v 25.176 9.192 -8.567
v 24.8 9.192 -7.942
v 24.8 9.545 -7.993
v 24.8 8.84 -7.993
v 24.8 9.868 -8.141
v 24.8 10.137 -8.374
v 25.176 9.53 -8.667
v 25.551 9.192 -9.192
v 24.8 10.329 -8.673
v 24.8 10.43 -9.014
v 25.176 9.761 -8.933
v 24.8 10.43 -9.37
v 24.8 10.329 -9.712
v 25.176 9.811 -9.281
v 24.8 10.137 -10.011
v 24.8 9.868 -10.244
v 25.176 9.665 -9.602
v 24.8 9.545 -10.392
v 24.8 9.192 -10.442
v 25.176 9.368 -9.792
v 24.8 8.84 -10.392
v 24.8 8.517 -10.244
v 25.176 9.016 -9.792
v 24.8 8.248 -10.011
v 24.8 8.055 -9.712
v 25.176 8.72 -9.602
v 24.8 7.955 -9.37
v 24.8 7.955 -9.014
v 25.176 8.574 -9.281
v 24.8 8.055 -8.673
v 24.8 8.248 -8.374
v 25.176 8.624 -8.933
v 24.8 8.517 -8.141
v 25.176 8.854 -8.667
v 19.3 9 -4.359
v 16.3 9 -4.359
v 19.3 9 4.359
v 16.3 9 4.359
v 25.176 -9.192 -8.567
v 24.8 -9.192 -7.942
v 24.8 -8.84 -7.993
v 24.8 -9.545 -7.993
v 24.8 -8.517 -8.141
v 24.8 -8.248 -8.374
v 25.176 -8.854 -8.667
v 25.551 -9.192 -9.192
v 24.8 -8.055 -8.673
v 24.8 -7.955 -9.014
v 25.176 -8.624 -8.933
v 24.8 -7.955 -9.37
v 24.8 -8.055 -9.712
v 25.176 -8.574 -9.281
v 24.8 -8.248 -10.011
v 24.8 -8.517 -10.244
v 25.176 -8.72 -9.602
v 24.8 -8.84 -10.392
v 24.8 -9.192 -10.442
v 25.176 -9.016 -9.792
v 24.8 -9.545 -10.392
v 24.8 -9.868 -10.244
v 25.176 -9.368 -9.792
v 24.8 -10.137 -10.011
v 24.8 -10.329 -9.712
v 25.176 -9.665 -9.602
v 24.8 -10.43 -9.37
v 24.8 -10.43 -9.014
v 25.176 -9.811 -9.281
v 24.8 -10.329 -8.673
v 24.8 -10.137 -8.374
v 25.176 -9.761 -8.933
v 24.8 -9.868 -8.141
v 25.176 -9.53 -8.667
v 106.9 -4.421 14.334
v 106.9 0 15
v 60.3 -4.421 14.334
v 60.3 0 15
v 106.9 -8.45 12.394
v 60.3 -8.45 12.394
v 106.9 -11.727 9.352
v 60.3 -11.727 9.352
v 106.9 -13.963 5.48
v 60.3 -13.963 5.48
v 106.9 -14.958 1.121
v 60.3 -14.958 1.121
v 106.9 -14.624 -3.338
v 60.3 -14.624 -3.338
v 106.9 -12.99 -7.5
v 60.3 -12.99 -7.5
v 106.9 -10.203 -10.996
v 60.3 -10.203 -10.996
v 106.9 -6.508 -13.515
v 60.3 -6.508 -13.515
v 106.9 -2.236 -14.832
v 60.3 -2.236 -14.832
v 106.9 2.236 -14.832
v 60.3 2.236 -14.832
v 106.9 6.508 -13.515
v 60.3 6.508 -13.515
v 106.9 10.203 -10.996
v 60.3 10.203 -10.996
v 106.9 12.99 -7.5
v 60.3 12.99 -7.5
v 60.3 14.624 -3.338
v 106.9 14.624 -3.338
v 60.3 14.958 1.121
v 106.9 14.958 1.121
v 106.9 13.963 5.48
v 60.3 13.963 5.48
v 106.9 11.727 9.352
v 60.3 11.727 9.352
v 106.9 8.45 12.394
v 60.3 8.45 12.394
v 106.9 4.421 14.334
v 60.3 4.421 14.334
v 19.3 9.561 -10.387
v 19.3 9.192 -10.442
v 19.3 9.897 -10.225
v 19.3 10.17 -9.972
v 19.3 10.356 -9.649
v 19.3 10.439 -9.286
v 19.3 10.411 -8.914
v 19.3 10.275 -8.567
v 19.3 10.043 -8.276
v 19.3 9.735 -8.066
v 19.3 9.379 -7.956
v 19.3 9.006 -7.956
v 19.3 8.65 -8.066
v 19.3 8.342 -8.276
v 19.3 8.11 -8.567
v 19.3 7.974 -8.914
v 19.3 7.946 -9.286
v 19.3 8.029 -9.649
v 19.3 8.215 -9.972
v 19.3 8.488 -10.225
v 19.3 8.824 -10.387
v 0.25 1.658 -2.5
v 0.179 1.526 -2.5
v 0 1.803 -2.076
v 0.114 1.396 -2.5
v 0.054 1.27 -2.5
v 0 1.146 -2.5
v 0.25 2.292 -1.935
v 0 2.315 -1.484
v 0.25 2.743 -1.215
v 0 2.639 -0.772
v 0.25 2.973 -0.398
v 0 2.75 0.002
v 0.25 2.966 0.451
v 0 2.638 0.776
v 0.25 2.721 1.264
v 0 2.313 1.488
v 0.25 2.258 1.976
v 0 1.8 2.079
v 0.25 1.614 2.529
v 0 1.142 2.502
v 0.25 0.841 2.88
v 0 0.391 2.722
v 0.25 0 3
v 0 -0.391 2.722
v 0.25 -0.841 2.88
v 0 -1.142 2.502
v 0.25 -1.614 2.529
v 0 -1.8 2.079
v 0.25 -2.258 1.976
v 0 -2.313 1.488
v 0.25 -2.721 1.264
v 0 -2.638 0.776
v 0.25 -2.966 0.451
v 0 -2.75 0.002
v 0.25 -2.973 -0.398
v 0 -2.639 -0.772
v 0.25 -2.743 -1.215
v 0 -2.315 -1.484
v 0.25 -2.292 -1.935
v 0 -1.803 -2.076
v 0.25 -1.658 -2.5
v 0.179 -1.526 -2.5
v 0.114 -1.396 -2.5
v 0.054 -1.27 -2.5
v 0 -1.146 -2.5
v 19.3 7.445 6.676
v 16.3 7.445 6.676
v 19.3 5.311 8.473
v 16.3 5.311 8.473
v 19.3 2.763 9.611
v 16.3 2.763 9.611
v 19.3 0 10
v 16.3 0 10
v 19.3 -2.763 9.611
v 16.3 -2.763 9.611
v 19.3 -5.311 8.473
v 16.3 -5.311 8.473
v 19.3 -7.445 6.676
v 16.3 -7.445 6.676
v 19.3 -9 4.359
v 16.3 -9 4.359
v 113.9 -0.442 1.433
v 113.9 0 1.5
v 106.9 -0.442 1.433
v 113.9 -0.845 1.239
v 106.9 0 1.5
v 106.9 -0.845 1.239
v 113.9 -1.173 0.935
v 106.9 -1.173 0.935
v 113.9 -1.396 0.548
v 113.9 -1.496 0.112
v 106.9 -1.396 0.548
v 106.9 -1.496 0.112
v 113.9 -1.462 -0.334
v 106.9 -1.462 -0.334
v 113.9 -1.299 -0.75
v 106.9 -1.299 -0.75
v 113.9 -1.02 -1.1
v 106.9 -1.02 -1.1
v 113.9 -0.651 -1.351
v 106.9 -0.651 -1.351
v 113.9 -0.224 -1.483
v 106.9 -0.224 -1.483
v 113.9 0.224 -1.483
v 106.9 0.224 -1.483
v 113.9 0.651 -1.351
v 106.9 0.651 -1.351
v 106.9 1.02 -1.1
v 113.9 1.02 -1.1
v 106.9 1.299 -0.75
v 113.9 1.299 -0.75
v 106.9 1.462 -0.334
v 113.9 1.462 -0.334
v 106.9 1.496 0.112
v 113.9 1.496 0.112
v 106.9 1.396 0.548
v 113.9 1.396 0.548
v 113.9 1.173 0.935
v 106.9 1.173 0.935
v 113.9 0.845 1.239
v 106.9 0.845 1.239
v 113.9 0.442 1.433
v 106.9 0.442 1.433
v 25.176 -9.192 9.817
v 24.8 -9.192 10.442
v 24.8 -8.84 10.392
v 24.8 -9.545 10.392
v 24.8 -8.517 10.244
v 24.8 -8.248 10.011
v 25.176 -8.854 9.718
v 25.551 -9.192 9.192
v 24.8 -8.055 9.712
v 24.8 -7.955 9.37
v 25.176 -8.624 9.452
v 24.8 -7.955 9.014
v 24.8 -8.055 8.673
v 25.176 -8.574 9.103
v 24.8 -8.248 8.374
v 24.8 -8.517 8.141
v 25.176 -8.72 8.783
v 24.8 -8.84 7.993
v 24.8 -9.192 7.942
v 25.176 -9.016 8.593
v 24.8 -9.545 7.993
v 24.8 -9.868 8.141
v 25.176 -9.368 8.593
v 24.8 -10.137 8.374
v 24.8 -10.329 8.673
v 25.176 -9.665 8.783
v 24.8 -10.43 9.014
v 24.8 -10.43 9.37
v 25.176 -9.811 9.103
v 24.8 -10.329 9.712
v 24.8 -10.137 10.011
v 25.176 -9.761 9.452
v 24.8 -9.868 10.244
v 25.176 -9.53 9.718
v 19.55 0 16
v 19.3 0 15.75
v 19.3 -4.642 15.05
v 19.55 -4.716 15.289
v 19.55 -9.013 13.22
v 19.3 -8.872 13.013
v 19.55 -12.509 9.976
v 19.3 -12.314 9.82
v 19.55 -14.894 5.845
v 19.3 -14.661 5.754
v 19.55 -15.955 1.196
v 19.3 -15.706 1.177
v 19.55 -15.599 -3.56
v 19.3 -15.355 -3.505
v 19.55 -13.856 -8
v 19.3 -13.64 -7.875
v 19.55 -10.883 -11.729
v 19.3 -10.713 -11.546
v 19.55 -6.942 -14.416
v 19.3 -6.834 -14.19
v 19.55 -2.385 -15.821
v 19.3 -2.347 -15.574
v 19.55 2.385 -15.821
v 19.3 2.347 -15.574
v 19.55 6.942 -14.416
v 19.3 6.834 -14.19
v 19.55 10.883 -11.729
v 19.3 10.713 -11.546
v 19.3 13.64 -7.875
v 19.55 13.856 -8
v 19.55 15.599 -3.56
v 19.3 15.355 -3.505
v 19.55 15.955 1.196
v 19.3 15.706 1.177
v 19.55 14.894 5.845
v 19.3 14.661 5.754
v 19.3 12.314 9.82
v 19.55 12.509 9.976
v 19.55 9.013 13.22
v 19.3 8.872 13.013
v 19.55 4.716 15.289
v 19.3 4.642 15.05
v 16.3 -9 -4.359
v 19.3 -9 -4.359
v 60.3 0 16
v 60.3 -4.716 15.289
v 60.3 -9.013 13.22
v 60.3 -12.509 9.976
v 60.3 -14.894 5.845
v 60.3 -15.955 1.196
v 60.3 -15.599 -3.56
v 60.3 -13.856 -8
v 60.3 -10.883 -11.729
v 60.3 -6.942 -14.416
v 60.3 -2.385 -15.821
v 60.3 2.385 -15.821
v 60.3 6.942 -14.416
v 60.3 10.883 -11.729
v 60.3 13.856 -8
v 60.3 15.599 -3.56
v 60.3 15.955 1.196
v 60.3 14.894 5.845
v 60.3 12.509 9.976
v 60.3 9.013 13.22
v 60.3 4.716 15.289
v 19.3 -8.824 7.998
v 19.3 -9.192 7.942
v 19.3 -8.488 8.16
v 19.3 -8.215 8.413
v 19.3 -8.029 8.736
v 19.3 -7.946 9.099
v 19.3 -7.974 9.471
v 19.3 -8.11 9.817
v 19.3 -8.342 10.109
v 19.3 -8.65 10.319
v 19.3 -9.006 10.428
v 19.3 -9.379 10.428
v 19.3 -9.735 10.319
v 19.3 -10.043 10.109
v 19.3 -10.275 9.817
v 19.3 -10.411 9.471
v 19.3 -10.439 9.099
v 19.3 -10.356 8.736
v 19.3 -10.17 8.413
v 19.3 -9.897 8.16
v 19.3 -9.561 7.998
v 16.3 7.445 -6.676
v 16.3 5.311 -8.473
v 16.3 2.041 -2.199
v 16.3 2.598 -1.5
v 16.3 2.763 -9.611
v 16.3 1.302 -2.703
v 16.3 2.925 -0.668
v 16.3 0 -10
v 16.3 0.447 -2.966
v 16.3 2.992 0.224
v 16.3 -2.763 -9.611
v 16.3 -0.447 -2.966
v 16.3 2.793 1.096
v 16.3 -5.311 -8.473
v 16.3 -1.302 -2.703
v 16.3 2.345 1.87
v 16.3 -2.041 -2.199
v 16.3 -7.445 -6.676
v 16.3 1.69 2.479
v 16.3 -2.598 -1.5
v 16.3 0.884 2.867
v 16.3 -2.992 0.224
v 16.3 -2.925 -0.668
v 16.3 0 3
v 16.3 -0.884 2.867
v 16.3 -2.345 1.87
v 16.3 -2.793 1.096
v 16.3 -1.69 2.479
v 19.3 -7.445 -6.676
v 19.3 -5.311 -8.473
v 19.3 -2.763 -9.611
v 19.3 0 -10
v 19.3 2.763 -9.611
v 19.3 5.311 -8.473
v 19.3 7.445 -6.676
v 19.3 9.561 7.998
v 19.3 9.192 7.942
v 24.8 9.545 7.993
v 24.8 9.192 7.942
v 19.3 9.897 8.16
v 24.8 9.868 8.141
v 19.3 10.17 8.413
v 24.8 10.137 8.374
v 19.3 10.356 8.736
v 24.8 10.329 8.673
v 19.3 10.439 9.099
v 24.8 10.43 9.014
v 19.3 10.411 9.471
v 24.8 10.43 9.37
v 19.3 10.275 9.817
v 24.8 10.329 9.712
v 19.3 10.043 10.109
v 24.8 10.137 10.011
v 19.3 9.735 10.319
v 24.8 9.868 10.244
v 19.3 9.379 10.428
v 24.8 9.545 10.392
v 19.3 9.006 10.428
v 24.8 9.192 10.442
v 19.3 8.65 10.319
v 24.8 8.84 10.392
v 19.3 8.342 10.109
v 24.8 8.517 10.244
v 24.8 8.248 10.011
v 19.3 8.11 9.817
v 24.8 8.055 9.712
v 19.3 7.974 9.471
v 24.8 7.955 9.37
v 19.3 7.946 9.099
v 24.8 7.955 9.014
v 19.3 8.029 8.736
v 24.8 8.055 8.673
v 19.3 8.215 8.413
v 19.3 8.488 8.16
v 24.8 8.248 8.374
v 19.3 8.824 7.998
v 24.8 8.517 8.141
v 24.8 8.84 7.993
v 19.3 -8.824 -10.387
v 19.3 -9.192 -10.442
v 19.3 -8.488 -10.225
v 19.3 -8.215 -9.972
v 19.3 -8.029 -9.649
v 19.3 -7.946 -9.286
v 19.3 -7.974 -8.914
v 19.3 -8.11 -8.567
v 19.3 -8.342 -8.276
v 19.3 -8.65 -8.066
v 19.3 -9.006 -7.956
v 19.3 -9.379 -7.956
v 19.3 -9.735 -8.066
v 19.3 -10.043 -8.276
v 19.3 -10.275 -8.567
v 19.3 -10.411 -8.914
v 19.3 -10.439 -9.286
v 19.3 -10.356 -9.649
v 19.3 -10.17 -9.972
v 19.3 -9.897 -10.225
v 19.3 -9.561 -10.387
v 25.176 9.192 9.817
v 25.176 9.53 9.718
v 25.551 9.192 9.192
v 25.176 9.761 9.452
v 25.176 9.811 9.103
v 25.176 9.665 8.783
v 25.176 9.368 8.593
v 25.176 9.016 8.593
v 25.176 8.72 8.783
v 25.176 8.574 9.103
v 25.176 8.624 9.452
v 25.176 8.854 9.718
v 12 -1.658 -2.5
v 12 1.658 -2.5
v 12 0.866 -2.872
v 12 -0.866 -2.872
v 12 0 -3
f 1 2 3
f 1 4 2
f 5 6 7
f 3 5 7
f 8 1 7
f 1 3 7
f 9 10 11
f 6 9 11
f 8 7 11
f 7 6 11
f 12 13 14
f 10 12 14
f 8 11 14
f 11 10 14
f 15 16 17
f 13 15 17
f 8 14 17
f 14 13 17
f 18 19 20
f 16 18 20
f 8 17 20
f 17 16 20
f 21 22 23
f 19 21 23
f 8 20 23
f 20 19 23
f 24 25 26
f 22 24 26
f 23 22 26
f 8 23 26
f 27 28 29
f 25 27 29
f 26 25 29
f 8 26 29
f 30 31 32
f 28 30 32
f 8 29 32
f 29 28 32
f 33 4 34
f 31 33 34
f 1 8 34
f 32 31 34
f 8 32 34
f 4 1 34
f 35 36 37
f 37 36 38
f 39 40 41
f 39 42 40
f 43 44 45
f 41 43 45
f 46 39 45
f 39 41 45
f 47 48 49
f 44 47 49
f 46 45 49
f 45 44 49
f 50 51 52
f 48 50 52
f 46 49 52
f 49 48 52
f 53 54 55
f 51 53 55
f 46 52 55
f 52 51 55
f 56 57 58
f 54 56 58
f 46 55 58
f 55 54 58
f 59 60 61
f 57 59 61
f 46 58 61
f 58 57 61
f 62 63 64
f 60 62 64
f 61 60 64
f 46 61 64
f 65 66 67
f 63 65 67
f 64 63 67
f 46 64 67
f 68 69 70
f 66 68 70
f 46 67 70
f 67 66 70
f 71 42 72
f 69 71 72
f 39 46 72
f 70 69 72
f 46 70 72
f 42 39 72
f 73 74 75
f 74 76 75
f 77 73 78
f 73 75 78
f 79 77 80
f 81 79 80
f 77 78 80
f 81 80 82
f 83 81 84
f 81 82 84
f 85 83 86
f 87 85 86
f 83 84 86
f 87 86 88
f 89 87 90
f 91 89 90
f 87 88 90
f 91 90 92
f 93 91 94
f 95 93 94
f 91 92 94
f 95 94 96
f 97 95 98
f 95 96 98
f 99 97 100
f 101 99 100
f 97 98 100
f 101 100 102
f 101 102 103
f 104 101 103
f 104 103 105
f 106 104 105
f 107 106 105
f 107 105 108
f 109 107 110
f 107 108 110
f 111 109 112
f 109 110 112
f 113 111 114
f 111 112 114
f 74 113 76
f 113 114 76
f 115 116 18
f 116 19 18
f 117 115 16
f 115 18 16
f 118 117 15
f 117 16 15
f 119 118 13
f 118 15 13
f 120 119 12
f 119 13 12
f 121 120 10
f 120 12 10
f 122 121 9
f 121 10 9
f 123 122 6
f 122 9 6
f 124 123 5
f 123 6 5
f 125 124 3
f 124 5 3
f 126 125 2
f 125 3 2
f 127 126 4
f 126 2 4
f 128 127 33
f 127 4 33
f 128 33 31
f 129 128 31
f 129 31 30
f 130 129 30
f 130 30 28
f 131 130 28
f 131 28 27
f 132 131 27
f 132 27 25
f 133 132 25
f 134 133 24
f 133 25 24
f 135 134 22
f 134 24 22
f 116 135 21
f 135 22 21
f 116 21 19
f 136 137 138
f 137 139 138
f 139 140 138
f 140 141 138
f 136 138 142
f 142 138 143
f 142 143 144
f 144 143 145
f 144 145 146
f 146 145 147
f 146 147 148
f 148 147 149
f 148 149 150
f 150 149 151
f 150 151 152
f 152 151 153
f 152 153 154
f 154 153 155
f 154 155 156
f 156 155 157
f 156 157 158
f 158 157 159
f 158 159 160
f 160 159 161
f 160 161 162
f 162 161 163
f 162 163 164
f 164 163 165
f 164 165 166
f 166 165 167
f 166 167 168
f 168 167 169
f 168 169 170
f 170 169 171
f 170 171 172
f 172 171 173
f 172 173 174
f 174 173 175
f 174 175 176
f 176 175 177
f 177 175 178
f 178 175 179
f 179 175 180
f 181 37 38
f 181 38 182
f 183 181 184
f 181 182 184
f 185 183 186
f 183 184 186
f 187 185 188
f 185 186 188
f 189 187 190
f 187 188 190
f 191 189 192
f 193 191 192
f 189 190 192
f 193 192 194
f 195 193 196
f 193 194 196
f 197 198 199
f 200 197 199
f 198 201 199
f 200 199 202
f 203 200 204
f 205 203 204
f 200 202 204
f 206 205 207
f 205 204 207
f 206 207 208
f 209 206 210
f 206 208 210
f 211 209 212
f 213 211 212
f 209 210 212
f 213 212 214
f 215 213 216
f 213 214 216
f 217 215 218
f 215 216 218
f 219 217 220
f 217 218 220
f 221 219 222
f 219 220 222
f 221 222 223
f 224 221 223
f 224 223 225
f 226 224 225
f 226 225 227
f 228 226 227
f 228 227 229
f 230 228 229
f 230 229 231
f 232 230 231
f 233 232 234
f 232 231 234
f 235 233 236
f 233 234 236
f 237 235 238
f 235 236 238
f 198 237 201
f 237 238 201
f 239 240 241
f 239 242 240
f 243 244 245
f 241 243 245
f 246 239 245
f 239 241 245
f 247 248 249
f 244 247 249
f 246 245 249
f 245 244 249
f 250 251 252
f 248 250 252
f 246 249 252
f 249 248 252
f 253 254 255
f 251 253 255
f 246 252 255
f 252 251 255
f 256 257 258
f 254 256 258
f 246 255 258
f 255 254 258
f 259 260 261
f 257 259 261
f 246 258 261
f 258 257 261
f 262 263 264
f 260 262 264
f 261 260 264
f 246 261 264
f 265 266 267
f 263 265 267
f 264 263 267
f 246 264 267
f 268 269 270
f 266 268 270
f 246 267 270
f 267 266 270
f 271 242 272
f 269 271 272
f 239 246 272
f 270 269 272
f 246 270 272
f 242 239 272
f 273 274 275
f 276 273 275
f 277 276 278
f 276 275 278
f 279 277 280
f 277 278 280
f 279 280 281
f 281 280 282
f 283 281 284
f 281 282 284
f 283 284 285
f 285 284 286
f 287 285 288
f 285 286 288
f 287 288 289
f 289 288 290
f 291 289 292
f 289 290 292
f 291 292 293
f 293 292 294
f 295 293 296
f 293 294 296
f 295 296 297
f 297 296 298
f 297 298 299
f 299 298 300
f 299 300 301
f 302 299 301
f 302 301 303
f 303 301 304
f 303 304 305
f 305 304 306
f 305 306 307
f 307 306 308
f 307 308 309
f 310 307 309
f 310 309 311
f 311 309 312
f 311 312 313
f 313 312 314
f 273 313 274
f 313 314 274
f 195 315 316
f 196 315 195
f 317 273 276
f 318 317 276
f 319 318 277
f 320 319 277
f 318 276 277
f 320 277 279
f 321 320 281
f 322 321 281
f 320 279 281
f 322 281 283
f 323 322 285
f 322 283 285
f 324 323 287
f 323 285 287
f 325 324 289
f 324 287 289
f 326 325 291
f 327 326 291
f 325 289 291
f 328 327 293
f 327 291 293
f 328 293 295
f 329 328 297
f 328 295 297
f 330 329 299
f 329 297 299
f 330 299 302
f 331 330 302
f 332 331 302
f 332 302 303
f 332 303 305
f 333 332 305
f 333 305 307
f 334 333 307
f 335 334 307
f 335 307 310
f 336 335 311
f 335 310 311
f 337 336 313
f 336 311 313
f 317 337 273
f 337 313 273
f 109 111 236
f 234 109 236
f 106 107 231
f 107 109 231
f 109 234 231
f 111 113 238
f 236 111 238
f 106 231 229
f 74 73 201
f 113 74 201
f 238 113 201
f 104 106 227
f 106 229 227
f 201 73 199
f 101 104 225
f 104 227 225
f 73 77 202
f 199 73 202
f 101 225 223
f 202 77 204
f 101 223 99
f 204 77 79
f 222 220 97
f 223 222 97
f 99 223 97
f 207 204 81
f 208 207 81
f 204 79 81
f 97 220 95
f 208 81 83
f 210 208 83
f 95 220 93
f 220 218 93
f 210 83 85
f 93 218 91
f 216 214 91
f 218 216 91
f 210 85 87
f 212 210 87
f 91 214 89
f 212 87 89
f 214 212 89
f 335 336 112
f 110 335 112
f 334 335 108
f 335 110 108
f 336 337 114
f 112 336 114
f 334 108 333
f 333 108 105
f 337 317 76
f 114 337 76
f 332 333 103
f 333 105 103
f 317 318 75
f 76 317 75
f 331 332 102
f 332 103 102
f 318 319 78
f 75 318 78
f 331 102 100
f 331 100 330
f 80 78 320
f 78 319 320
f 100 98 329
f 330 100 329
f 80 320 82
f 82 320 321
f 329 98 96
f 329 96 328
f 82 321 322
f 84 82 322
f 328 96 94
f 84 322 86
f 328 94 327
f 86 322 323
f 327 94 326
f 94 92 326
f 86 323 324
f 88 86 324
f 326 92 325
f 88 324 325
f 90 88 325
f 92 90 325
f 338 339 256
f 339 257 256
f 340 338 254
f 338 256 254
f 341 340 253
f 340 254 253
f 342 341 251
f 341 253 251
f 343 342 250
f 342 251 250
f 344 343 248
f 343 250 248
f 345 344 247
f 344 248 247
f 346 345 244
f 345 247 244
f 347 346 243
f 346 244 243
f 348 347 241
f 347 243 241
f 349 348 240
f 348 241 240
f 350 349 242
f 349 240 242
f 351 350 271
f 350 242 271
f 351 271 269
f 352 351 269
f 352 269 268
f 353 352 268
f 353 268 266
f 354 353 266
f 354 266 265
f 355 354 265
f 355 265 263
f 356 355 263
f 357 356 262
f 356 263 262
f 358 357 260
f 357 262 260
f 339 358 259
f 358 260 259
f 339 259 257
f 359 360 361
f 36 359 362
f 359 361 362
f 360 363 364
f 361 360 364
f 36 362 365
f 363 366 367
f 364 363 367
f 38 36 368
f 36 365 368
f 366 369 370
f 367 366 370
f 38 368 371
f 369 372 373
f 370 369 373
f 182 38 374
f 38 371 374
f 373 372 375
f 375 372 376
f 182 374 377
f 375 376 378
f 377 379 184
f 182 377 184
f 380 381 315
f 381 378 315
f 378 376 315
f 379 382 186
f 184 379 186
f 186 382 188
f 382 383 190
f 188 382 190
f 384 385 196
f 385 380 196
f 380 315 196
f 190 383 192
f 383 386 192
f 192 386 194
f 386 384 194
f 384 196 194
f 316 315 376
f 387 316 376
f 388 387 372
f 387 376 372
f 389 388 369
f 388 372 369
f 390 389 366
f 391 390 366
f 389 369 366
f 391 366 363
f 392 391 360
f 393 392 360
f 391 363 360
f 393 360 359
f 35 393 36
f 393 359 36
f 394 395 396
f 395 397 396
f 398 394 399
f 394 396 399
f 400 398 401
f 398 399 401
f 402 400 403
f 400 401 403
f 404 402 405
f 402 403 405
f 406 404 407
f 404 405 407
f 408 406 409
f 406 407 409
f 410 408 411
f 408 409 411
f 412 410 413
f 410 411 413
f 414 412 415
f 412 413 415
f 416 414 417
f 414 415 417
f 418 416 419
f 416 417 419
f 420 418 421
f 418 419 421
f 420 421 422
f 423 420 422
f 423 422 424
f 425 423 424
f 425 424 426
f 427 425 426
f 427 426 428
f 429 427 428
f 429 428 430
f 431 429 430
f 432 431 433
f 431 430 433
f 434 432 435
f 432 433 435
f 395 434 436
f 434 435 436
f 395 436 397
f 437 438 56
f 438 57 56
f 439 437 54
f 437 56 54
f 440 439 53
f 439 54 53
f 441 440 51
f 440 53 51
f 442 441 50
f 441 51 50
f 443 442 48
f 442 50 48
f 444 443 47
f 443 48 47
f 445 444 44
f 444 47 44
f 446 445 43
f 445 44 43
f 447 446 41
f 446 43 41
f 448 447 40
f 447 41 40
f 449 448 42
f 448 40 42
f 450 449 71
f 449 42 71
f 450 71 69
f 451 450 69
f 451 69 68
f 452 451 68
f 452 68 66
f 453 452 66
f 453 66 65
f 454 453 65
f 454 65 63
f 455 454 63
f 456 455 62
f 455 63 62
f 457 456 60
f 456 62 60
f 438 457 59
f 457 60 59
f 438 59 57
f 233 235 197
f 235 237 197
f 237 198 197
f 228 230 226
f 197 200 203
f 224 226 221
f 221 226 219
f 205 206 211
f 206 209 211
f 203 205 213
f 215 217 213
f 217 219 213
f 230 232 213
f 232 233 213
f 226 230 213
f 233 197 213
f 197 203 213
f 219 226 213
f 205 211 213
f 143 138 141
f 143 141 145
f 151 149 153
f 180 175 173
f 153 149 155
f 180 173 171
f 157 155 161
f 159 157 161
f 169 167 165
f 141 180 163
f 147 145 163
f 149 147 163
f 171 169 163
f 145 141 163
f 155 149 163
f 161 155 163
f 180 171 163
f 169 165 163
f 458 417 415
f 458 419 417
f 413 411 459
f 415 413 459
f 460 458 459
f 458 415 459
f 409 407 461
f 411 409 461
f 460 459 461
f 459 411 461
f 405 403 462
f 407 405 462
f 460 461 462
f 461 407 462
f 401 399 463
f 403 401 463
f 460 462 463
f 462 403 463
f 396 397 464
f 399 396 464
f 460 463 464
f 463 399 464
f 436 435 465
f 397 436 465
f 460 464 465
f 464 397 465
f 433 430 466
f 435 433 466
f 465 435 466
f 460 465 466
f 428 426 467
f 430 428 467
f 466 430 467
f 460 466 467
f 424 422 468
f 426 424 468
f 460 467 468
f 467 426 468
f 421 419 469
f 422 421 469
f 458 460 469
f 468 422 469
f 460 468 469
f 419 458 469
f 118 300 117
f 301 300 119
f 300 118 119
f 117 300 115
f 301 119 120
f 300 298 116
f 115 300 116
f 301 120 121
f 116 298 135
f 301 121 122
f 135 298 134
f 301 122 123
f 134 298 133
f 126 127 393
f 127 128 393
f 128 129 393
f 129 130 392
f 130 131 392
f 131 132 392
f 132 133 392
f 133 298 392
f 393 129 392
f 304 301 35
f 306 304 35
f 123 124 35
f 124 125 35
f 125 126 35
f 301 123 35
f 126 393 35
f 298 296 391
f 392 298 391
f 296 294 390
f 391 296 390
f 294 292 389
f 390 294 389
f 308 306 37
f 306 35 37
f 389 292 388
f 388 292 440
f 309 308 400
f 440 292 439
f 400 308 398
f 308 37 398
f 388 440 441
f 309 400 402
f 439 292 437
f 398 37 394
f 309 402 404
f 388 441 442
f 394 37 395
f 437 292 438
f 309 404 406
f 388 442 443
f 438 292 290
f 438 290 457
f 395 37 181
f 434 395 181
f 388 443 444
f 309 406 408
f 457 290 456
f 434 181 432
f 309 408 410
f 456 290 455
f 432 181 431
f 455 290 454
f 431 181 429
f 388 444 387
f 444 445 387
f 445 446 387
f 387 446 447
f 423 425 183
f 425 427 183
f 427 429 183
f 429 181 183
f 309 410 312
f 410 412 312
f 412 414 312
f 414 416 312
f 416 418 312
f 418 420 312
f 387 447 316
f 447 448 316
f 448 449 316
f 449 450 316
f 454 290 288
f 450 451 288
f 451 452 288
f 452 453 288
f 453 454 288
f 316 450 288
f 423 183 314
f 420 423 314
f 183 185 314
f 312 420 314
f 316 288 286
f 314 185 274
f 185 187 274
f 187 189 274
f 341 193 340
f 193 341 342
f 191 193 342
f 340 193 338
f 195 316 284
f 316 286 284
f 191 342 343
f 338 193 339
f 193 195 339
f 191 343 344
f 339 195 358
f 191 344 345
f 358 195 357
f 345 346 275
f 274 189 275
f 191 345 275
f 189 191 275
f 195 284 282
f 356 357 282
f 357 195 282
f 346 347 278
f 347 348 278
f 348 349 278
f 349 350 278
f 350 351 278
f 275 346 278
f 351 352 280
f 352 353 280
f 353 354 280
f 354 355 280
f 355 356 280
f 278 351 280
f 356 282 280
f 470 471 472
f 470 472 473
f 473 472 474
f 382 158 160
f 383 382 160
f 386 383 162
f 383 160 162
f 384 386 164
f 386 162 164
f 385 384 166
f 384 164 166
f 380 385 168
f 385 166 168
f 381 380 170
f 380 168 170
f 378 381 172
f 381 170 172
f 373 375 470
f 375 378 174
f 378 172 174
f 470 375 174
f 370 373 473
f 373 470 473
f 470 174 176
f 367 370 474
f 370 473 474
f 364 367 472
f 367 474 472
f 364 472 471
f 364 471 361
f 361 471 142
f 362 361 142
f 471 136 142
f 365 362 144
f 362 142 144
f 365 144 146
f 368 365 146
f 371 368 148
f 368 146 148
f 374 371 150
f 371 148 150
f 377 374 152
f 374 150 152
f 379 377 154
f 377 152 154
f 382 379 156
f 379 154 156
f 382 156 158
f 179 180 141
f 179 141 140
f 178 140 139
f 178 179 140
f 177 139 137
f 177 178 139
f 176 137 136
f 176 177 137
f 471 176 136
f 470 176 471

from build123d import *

# Parameters (mm, degrees)
CUT_EXTRUDE1_DEPTH        = 117.125836918
CUT_EXTRUDE1_DEPTH_BACK   = 117.125836918
SKETCH2_W                 = 12
SKETCH2_H                 = 0.5
CHAMFER1_SIZE             = 0.25
SKETCH3_W                 = 20
SKETCH3_H                 = 2
CUT_EXTRUDE2_DEPTH        = 3
M3X0_5_TAPPED_HOLE1_D     = 2.5
M3X0_5_TAPPED_HOLE1_DEPTH = 5.5
M3X0_5_TAPPED_HOLE1_TIP   = 0.751075774


with BuildPart() as part:
    # Sketch1 → Revolve1 (revolve)
    with BuildSketch(Plane(origin=(0, 0, 0), x_dir=(1, 0, 0), z_dir=(0, 1, 0)), mode=Mode.PRIVATE) as revolve1_sk:
        Polygon((0, 0), (113.9, 0), (113.9, 1.5), (106.9, 1.5), (106.9, 15), (60.3, 15), (60.3, 16), (19.3, 16), (19.3, 10), (16.3, 10), (16.3, 3), (0, 3), align=None)
    revolve(revolve1_sk.sketch.rotate(Axis((0, 0, 0), (1, 0, 0)), 180), axis=Axis((0, 0, 0), (1, 0, 0)))

    # Sketch2 → Cut-Extrude1 (cut, two sides: drawn at the far end of the back side and taken through both)
    with BuildSketch(Plane(origin=(0, 0, 0), x_dir=(1, 0, 0), z_dir=(0, 1, 0)).offset(-CUT_EXTRUDE1_DEPTH_BACK)):
        with Locations((6, 2.75)):
            Rectangle(SKETCH2_W, SKETCH2_H)
    extrude(amount=CUT_EXTRUDE1_DEPTH + CUT_EXTRUDE1_DEPTH_BACK, mode=Mode.SUBTRACT)

    # Chamfer1
    chamfer1_edges = [part.edges().sort_by_distance(p)[0] for p in [
        (19.3, 0, -16),
        (0, 2.872281323, 0.866025404),
    ]]
    chamfer(chamfer1_edges, length=CHAMFER1_SIZE)

    # Sketch3 → Cut-Extrude2 (cut)
    with BuildSketch(Plane.ZY.offset(-16.3)):
        with Locations((0, 10)):
            Rectangle(SKETCH3_W, SKETCH3_H)
        with Locations((0, -10)):
            Rectangle(SKETCH3_W, SKETCH3_H)
    extrude(amount=-CUT_EXTRUDE2_DEPTH, mode=Mode.SUBTRACT)

    # M3x0.5 Tapped Hole1
    with Locations(Plane.ZY.offset(-19.3)):
        with Locations((-9.192388155, -9.192388155), (-9.192388155, 9.192388155), (9.192388155, 9.192388155), (9.192388155, -9.192388155)):
            Hole(M3X0_5_TAPPED_HOLE1_D / 2, depth=M3X0_5_TAPPED_HOLE1_DEPTH)
            with Locations((0, 0, -(M3X0_5_TAPPED_HOLE1_DEPTH + M3X0_5_TAPPED_HOLE1_TIP / 2))):  # 118° drill point
                Cone(0, M3X0_5_TAPPED_HOLE1_D / 2, M3X0_5_TAPPED_HOLE1_TIP, mode=Mode.SUBTRACT)


solid = part.part
